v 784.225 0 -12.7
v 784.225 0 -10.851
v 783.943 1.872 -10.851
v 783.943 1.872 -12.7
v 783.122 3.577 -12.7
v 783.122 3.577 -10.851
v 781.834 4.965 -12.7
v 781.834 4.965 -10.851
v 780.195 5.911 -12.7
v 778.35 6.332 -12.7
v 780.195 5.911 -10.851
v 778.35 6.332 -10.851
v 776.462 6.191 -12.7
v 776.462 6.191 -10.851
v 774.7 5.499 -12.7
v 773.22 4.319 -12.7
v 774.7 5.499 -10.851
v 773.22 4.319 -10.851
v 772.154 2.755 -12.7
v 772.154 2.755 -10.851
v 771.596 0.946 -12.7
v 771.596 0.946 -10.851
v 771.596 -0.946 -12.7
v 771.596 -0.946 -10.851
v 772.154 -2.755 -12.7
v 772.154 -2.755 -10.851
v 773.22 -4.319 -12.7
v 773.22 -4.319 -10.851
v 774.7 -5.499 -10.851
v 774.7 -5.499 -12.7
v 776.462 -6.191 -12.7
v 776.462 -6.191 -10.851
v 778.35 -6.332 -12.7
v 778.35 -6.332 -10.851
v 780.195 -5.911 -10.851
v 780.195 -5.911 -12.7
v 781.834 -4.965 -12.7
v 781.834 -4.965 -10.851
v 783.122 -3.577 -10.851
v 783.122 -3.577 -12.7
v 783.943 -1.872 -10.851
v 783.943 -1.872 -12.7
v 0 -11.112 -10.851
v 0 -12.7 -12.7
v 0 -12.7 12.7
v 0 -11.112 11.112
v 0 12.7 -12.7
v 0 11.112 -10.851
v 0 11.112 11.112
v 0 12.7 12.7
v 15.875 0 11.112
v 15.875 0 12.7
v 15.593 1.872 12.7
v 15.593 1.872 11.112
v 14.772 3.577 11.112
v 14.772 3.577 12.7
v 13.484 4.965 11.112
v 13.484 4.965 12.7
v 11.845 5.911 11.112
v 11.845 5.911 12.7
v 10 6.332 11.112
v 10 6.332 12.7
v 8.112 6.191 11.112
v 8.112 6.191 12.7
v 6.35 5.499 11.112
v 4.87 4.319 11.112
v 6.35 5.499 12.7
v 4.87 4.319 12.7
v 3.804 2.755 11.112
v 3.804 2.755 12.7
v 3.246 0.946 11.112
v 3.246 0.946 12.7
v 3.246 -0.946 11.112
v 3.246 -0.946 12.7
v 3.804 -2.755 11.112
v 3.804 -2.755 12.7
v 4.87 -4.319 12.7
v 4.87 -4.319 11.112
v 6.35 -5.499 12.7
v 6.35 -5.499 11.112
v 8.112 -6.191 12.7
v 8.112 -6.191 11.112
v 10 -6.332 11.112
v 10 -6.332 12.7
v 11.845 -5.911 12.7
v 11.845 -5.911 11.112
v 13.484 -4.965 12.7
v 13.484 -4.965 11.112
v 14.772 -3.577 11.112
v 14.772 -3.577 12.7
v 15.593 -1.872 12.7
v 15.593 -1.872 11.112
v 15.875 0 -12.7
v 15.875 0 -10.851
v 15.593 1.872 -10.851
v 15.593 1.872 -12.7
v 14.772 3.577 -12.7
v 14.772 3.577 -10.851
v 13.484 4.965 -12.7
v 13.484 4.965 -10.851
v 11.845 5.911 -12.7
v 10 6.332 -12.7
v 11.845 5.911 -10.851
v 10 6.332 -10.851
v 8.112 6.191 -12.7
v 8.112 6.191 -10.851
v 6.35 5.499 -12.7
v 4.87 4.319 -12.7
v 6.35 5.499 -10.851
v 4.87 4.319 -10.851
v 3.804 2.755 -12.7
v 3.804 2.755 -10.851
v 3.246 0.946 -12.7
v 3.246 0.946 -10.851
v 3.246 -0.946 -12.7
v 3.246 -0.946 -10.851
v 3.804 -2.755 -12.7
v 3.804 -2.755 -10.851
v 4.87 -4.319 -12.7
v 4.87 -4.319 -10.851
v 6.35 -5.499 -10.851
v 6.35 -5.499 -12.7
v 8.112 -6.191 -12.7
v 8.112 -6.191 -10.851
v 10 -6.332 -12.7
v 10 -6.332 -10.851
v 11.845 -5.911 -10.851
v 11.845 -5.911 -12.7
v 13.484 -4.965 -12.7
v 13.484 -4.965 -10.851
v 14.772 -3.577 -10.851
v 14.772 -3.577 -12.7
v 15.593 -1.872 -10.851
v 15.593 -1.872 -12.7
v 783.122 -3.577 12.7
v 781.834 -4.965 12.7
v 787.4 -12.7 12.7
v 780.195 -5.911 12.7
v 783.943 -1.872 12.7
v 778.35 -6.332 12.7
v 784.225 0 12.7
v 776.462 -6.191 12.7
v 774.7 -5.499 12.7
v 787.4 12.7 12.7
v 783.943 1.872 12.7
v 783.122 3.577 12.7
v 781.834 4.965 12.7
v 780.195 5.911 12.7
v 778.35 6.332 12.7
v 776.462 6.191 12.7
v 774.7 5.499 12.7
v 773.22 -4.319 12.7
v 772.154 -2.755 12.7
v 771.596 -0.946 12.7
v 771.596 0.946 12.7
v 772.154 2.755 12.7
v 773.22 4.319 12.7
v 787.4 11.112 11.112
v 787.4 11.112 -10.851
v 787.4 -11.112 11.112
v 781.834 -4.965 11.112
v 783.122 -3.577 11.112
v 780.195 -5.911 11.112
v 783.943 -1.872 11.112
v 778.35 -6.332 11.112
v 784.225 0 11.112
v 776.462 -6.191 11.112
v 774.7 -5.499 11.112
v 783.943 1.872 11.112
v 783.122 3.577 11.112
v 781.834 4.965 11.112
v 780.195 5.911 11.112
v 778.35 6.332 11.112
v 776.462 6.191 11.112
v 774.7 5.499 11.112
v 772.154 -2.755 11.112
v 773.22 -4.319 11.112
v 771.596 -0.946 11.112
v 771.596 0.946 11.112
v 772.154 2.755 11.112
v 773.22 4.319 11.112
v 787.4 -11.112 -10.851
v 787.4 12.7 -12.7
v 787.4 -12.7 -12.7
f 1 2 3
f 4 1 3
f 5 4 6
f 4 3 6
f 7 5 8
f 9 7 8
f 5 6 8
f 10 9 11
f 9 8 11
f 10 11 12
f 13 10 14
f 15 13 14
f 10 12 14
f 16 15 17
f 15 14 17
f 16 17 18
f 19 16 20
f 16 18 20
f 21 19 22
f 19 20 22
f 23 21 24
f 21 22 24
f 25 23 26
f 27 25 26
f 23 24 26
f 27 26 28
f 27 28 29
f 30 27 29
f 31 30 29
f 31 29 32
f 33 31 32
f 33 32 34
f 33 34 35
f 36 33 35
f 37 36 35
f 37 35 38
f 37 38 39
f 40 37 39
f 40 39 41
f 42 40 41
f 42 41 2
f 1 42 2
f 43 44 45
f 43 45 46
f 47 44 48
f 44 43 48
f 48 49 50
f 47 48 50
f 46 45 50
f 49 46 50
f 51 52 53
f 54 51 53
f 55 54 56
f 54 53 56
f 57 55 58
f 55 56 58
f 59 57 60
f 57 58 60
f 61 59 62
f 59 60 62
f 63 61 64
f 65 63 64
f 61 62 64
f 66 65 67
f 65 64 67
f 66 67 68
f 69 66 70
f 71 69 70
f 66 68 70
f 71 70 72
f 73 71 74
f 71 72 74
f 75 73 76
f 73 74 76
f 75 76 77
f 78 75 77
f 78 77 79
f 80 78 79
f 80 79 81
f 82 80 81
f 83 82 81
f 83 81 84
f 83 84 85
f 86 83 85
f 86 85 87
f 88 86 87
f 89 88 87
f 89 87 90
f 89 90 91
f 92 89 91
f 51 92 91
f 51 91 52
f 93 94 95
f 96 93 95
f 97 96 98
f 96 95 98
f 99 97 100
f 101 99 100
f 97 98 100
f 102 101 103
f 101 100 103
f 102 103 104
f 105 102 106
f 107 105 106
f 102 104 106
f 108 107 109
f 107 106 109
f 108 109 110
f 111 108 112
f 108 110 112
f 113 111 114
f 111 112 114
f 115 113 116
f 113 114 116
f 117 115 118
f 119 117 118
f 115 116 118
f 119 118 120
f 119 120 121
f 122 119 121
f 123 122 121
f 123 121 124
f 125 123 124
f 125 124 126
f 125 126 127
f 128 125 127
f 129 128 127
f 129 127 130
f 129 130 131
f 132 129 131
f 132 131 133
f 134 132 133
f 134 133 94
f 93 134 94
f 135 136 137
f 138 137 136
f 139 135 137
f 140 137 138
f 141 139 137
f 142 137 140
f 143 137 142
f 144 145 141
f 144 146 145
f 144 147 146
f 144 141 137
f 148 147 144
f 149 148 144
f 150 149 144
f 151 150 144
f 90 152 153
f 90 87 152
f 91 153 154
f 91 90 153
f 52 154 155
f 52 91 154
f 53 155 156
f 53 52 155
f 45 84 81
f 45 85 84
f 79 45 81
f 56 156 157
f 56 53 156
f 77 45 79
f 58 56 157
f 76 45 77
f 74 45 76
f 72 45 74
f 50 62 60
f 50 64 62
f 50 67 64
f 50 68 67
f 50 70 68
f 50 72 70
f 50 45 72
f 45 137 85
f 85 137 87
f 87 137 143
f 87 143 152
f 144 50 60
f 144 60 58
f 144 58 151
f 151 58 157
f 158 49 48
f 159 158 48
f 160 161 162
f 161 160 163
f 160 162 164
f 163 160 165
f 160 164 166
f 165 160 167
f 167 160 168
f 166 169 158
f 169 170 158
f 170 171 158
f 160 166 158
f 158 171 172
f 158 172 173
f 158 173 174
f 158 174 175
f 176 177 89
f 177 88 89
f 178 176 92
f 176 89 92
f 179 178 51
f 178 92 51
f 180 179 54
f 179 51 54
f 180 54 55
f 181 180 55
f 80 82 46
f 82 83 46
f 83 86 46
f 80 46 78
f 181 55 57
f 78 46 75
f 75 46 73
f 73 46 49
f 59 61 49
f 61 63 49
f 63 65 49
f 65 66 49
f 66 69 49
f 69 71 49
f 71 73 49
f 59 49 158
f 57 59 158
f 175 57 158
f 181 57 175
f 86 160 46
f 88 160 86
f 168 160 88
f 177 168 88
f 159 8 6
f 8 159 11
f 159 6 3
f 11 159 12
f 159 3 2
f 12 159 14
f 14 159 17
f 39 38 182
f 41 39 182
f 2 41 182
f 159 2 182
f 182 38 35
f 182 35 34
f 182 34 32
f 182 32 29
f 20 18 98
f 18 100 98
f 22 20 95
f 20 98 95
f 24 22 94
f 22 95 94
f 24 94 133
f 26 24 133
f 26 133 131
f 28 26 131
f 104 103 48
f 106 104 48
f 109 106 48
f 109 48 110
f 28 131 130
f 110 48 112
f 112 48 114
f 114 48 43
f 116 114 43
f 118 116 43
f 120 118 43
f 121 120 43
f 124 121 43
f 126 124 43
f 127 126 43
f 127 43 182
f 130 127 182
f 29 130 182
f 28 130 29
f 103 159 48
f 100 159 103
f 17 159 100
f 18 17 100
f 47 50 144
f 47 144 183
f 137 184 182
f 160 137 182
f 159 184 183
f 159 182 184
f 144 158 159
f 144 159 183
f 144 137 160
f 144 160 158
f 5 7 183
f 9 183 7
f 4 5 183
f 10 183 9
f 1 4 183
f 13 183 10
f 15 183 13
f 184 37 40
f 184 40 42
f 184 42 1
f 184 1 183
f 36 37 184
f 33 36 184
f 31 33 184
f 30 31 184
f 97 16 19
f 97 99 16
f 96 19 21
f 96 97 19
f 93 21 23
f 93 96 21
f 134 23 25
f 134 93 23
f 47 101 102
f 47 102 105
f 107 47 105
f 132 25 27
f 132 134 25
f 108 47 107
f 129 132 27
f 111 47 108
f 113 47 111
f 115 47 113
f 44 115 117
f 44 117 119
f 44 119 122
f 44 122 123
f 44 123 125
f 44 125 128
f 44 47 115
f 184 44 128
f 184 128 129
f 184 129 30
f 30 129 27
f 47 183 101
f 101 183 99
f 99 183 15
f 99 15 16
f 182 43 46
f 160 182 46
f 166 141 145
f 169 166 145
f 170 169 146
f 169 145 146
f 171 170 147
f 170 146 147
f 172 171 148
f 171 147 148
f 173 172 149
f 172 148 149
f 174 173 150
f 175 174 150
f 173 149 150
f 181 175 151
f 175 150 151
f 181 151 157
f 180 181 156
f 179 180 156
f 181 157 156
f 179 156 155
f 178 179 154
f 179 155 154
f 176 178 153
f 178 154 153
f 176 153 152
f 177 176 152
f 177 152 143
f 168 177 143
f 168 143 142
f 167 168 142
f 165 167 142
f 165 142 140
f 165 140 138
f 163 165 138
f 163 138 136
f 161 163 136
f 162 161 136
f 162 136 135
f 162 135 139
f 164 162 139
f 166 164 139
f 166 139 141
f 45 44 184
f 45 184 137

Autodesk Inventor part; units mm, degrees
ref_plane "YZ Plane" through (0, 0, 0) normal (1, 0, 0) x (0, 1, 0)
ref_plane "XZ Plane" through (0, 0, 0) normal (0, 1, 0) x (-1, 0, 0)
ref_plane "XY Plane" through (0, 0, 0) normal (0, 0, 1) x (1, 0, 0)
sketch "Sketch1" plane through (0, 0, 0) normal (1, 0, 0) x (0, 1, 0)
  line L0 (-12.7, 12.7) -> (12.7, 12.7)
  line L1 (12.7, 12.7) -> (12.7, -12.7)
  line L2 (12.7, -12.7) -> (-12.7, -12.7)
  line L3 (-12.7, -12.7) -> (-12.7, 12.7)
  line L4 (-11.1125, 11.1125) -> (11.1125, 11.1125)
  line L5 (11.1125, 11.1125) -> (11.1125, -10.8514)
  line L6 (11.1125, -10.8514) -> (-11.1125, -10.8514)
  line L7 (-11.1125, -10.8514) -> (-11.1125, 11.1125)
  point P0 (0, 0)
  point P1 (0, 12.7)
  point P2 (-12.7, 0)
  dimension "d0" = 25.4
  dimension "d1" = 25.4
  dimension "d2" = 1.5875
  dimension "d3" = 1.5875
  dimension "d4" = 1.5875
extrude "Extrusion1" add sketch "Sketch1" along normal blind 787.4
sketch "Sketch2" plane through (0, -12.7, 12.7) normal (0, 0, 1) x (1, 0, 0)
  circle A0 centre (9.525, 12.7) radius 6.35
  circle A1 centre (777.875, 12.7) radius 6.35
  line L0 (787.4, 25.4) -> (787.4, 0) projected
  point P0 (0, 12.7)
  dimension "d7" = 12.7
  dimension "d8" = 9.525
  dimension "d9" = 12.7
  dimension "d10" = 9.525
extrude "Extrusion2" cut sketch "Sketch2" against normal blind 50.8
equation "\"d1\" = d0"
equation "\"d3\" = d2"
equation "\"d4\" = d2"
equation "\"d9\" = d7"
equation "\"d10\" = d8"
properties part number "Long Bar"
